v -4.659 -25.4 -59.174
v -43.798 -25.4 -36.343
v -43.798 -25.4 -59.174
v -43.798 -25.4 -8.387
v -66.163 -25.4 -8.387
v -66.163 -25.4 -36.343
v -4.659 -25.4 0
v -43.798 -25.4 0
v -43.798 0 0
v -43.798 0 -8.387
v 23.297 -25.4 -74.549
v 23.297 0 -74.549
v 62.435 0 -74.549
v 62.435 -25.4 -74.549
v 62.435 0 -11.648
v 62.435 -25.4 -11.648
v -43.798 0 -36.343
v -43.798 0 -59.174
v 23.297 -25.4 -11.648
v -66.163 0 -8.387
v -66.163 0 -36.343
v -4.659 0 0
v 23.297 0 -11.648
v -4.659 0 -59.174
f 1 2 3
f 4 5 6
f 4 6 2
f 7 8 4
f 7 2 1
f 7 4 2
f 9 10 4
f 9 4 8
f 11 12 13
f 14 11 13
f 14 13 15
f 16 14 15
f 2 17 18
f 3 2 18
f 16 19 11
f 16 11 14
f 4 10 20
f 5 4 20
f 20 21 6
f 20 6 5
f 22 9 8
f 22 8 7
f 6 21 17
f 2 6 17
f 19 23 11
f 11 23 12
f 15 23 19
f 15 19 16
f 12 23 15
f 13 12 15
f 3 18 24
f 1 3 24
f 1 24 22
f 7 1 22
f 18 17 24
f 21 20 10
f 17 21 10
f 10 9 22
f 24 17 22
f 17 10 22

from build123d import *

# Parameters (mm, degrees)
F0_W     = 39.1384833492
F0_H     = 27.9560647905
F0_H_2   = 22.8307805955
F0_W_2   = 22.364847362
F0_H_3   = 8.3868168294
F1_DEPTH = 25.4
F0_W_3   = 39.1384866089
F0_H_4   = 24.6945247054
F0_H_5   = 38.2066071033


with BuildPart() as f1:
    # F0 (on Front) → F1 (new body)
    with BuildSketch(Plane.XZ):
        with Locations((-24.2285865825, -22.3648492247)):
            Rectangle(F0_W, F0_H)
        with Locations((-24.2285865825, -47.7582719177)):
            Rectangle(F0_W, F0_H_2)
        with Locations((-54.9802519381, -22.3648492247)):
            Rectangle(F0_W_2, F0_H)
        with Locations((-24.2285865825, -4.1934084147)):
            Rectangle(F0_W, F0_H_3)
    extrude(amount=F1_DEPTH)


with BuildPart() as f1b:
    # F0 (on Front) → F1, piece 2 (new body)
    with BuildSketch(Plane.XZ):
        with Locations((42.8659627214, -23.9956192672)):
            Rectangle(F0_W_3, F0_H_4)
        with Locations((42.8659627214, -55.4461851716)):
            Rectangle(F0_W_3, F0_H_5)
    extrude(amount=F1_DEPTH)


solid = Compound([f1.part, f1b.part])
